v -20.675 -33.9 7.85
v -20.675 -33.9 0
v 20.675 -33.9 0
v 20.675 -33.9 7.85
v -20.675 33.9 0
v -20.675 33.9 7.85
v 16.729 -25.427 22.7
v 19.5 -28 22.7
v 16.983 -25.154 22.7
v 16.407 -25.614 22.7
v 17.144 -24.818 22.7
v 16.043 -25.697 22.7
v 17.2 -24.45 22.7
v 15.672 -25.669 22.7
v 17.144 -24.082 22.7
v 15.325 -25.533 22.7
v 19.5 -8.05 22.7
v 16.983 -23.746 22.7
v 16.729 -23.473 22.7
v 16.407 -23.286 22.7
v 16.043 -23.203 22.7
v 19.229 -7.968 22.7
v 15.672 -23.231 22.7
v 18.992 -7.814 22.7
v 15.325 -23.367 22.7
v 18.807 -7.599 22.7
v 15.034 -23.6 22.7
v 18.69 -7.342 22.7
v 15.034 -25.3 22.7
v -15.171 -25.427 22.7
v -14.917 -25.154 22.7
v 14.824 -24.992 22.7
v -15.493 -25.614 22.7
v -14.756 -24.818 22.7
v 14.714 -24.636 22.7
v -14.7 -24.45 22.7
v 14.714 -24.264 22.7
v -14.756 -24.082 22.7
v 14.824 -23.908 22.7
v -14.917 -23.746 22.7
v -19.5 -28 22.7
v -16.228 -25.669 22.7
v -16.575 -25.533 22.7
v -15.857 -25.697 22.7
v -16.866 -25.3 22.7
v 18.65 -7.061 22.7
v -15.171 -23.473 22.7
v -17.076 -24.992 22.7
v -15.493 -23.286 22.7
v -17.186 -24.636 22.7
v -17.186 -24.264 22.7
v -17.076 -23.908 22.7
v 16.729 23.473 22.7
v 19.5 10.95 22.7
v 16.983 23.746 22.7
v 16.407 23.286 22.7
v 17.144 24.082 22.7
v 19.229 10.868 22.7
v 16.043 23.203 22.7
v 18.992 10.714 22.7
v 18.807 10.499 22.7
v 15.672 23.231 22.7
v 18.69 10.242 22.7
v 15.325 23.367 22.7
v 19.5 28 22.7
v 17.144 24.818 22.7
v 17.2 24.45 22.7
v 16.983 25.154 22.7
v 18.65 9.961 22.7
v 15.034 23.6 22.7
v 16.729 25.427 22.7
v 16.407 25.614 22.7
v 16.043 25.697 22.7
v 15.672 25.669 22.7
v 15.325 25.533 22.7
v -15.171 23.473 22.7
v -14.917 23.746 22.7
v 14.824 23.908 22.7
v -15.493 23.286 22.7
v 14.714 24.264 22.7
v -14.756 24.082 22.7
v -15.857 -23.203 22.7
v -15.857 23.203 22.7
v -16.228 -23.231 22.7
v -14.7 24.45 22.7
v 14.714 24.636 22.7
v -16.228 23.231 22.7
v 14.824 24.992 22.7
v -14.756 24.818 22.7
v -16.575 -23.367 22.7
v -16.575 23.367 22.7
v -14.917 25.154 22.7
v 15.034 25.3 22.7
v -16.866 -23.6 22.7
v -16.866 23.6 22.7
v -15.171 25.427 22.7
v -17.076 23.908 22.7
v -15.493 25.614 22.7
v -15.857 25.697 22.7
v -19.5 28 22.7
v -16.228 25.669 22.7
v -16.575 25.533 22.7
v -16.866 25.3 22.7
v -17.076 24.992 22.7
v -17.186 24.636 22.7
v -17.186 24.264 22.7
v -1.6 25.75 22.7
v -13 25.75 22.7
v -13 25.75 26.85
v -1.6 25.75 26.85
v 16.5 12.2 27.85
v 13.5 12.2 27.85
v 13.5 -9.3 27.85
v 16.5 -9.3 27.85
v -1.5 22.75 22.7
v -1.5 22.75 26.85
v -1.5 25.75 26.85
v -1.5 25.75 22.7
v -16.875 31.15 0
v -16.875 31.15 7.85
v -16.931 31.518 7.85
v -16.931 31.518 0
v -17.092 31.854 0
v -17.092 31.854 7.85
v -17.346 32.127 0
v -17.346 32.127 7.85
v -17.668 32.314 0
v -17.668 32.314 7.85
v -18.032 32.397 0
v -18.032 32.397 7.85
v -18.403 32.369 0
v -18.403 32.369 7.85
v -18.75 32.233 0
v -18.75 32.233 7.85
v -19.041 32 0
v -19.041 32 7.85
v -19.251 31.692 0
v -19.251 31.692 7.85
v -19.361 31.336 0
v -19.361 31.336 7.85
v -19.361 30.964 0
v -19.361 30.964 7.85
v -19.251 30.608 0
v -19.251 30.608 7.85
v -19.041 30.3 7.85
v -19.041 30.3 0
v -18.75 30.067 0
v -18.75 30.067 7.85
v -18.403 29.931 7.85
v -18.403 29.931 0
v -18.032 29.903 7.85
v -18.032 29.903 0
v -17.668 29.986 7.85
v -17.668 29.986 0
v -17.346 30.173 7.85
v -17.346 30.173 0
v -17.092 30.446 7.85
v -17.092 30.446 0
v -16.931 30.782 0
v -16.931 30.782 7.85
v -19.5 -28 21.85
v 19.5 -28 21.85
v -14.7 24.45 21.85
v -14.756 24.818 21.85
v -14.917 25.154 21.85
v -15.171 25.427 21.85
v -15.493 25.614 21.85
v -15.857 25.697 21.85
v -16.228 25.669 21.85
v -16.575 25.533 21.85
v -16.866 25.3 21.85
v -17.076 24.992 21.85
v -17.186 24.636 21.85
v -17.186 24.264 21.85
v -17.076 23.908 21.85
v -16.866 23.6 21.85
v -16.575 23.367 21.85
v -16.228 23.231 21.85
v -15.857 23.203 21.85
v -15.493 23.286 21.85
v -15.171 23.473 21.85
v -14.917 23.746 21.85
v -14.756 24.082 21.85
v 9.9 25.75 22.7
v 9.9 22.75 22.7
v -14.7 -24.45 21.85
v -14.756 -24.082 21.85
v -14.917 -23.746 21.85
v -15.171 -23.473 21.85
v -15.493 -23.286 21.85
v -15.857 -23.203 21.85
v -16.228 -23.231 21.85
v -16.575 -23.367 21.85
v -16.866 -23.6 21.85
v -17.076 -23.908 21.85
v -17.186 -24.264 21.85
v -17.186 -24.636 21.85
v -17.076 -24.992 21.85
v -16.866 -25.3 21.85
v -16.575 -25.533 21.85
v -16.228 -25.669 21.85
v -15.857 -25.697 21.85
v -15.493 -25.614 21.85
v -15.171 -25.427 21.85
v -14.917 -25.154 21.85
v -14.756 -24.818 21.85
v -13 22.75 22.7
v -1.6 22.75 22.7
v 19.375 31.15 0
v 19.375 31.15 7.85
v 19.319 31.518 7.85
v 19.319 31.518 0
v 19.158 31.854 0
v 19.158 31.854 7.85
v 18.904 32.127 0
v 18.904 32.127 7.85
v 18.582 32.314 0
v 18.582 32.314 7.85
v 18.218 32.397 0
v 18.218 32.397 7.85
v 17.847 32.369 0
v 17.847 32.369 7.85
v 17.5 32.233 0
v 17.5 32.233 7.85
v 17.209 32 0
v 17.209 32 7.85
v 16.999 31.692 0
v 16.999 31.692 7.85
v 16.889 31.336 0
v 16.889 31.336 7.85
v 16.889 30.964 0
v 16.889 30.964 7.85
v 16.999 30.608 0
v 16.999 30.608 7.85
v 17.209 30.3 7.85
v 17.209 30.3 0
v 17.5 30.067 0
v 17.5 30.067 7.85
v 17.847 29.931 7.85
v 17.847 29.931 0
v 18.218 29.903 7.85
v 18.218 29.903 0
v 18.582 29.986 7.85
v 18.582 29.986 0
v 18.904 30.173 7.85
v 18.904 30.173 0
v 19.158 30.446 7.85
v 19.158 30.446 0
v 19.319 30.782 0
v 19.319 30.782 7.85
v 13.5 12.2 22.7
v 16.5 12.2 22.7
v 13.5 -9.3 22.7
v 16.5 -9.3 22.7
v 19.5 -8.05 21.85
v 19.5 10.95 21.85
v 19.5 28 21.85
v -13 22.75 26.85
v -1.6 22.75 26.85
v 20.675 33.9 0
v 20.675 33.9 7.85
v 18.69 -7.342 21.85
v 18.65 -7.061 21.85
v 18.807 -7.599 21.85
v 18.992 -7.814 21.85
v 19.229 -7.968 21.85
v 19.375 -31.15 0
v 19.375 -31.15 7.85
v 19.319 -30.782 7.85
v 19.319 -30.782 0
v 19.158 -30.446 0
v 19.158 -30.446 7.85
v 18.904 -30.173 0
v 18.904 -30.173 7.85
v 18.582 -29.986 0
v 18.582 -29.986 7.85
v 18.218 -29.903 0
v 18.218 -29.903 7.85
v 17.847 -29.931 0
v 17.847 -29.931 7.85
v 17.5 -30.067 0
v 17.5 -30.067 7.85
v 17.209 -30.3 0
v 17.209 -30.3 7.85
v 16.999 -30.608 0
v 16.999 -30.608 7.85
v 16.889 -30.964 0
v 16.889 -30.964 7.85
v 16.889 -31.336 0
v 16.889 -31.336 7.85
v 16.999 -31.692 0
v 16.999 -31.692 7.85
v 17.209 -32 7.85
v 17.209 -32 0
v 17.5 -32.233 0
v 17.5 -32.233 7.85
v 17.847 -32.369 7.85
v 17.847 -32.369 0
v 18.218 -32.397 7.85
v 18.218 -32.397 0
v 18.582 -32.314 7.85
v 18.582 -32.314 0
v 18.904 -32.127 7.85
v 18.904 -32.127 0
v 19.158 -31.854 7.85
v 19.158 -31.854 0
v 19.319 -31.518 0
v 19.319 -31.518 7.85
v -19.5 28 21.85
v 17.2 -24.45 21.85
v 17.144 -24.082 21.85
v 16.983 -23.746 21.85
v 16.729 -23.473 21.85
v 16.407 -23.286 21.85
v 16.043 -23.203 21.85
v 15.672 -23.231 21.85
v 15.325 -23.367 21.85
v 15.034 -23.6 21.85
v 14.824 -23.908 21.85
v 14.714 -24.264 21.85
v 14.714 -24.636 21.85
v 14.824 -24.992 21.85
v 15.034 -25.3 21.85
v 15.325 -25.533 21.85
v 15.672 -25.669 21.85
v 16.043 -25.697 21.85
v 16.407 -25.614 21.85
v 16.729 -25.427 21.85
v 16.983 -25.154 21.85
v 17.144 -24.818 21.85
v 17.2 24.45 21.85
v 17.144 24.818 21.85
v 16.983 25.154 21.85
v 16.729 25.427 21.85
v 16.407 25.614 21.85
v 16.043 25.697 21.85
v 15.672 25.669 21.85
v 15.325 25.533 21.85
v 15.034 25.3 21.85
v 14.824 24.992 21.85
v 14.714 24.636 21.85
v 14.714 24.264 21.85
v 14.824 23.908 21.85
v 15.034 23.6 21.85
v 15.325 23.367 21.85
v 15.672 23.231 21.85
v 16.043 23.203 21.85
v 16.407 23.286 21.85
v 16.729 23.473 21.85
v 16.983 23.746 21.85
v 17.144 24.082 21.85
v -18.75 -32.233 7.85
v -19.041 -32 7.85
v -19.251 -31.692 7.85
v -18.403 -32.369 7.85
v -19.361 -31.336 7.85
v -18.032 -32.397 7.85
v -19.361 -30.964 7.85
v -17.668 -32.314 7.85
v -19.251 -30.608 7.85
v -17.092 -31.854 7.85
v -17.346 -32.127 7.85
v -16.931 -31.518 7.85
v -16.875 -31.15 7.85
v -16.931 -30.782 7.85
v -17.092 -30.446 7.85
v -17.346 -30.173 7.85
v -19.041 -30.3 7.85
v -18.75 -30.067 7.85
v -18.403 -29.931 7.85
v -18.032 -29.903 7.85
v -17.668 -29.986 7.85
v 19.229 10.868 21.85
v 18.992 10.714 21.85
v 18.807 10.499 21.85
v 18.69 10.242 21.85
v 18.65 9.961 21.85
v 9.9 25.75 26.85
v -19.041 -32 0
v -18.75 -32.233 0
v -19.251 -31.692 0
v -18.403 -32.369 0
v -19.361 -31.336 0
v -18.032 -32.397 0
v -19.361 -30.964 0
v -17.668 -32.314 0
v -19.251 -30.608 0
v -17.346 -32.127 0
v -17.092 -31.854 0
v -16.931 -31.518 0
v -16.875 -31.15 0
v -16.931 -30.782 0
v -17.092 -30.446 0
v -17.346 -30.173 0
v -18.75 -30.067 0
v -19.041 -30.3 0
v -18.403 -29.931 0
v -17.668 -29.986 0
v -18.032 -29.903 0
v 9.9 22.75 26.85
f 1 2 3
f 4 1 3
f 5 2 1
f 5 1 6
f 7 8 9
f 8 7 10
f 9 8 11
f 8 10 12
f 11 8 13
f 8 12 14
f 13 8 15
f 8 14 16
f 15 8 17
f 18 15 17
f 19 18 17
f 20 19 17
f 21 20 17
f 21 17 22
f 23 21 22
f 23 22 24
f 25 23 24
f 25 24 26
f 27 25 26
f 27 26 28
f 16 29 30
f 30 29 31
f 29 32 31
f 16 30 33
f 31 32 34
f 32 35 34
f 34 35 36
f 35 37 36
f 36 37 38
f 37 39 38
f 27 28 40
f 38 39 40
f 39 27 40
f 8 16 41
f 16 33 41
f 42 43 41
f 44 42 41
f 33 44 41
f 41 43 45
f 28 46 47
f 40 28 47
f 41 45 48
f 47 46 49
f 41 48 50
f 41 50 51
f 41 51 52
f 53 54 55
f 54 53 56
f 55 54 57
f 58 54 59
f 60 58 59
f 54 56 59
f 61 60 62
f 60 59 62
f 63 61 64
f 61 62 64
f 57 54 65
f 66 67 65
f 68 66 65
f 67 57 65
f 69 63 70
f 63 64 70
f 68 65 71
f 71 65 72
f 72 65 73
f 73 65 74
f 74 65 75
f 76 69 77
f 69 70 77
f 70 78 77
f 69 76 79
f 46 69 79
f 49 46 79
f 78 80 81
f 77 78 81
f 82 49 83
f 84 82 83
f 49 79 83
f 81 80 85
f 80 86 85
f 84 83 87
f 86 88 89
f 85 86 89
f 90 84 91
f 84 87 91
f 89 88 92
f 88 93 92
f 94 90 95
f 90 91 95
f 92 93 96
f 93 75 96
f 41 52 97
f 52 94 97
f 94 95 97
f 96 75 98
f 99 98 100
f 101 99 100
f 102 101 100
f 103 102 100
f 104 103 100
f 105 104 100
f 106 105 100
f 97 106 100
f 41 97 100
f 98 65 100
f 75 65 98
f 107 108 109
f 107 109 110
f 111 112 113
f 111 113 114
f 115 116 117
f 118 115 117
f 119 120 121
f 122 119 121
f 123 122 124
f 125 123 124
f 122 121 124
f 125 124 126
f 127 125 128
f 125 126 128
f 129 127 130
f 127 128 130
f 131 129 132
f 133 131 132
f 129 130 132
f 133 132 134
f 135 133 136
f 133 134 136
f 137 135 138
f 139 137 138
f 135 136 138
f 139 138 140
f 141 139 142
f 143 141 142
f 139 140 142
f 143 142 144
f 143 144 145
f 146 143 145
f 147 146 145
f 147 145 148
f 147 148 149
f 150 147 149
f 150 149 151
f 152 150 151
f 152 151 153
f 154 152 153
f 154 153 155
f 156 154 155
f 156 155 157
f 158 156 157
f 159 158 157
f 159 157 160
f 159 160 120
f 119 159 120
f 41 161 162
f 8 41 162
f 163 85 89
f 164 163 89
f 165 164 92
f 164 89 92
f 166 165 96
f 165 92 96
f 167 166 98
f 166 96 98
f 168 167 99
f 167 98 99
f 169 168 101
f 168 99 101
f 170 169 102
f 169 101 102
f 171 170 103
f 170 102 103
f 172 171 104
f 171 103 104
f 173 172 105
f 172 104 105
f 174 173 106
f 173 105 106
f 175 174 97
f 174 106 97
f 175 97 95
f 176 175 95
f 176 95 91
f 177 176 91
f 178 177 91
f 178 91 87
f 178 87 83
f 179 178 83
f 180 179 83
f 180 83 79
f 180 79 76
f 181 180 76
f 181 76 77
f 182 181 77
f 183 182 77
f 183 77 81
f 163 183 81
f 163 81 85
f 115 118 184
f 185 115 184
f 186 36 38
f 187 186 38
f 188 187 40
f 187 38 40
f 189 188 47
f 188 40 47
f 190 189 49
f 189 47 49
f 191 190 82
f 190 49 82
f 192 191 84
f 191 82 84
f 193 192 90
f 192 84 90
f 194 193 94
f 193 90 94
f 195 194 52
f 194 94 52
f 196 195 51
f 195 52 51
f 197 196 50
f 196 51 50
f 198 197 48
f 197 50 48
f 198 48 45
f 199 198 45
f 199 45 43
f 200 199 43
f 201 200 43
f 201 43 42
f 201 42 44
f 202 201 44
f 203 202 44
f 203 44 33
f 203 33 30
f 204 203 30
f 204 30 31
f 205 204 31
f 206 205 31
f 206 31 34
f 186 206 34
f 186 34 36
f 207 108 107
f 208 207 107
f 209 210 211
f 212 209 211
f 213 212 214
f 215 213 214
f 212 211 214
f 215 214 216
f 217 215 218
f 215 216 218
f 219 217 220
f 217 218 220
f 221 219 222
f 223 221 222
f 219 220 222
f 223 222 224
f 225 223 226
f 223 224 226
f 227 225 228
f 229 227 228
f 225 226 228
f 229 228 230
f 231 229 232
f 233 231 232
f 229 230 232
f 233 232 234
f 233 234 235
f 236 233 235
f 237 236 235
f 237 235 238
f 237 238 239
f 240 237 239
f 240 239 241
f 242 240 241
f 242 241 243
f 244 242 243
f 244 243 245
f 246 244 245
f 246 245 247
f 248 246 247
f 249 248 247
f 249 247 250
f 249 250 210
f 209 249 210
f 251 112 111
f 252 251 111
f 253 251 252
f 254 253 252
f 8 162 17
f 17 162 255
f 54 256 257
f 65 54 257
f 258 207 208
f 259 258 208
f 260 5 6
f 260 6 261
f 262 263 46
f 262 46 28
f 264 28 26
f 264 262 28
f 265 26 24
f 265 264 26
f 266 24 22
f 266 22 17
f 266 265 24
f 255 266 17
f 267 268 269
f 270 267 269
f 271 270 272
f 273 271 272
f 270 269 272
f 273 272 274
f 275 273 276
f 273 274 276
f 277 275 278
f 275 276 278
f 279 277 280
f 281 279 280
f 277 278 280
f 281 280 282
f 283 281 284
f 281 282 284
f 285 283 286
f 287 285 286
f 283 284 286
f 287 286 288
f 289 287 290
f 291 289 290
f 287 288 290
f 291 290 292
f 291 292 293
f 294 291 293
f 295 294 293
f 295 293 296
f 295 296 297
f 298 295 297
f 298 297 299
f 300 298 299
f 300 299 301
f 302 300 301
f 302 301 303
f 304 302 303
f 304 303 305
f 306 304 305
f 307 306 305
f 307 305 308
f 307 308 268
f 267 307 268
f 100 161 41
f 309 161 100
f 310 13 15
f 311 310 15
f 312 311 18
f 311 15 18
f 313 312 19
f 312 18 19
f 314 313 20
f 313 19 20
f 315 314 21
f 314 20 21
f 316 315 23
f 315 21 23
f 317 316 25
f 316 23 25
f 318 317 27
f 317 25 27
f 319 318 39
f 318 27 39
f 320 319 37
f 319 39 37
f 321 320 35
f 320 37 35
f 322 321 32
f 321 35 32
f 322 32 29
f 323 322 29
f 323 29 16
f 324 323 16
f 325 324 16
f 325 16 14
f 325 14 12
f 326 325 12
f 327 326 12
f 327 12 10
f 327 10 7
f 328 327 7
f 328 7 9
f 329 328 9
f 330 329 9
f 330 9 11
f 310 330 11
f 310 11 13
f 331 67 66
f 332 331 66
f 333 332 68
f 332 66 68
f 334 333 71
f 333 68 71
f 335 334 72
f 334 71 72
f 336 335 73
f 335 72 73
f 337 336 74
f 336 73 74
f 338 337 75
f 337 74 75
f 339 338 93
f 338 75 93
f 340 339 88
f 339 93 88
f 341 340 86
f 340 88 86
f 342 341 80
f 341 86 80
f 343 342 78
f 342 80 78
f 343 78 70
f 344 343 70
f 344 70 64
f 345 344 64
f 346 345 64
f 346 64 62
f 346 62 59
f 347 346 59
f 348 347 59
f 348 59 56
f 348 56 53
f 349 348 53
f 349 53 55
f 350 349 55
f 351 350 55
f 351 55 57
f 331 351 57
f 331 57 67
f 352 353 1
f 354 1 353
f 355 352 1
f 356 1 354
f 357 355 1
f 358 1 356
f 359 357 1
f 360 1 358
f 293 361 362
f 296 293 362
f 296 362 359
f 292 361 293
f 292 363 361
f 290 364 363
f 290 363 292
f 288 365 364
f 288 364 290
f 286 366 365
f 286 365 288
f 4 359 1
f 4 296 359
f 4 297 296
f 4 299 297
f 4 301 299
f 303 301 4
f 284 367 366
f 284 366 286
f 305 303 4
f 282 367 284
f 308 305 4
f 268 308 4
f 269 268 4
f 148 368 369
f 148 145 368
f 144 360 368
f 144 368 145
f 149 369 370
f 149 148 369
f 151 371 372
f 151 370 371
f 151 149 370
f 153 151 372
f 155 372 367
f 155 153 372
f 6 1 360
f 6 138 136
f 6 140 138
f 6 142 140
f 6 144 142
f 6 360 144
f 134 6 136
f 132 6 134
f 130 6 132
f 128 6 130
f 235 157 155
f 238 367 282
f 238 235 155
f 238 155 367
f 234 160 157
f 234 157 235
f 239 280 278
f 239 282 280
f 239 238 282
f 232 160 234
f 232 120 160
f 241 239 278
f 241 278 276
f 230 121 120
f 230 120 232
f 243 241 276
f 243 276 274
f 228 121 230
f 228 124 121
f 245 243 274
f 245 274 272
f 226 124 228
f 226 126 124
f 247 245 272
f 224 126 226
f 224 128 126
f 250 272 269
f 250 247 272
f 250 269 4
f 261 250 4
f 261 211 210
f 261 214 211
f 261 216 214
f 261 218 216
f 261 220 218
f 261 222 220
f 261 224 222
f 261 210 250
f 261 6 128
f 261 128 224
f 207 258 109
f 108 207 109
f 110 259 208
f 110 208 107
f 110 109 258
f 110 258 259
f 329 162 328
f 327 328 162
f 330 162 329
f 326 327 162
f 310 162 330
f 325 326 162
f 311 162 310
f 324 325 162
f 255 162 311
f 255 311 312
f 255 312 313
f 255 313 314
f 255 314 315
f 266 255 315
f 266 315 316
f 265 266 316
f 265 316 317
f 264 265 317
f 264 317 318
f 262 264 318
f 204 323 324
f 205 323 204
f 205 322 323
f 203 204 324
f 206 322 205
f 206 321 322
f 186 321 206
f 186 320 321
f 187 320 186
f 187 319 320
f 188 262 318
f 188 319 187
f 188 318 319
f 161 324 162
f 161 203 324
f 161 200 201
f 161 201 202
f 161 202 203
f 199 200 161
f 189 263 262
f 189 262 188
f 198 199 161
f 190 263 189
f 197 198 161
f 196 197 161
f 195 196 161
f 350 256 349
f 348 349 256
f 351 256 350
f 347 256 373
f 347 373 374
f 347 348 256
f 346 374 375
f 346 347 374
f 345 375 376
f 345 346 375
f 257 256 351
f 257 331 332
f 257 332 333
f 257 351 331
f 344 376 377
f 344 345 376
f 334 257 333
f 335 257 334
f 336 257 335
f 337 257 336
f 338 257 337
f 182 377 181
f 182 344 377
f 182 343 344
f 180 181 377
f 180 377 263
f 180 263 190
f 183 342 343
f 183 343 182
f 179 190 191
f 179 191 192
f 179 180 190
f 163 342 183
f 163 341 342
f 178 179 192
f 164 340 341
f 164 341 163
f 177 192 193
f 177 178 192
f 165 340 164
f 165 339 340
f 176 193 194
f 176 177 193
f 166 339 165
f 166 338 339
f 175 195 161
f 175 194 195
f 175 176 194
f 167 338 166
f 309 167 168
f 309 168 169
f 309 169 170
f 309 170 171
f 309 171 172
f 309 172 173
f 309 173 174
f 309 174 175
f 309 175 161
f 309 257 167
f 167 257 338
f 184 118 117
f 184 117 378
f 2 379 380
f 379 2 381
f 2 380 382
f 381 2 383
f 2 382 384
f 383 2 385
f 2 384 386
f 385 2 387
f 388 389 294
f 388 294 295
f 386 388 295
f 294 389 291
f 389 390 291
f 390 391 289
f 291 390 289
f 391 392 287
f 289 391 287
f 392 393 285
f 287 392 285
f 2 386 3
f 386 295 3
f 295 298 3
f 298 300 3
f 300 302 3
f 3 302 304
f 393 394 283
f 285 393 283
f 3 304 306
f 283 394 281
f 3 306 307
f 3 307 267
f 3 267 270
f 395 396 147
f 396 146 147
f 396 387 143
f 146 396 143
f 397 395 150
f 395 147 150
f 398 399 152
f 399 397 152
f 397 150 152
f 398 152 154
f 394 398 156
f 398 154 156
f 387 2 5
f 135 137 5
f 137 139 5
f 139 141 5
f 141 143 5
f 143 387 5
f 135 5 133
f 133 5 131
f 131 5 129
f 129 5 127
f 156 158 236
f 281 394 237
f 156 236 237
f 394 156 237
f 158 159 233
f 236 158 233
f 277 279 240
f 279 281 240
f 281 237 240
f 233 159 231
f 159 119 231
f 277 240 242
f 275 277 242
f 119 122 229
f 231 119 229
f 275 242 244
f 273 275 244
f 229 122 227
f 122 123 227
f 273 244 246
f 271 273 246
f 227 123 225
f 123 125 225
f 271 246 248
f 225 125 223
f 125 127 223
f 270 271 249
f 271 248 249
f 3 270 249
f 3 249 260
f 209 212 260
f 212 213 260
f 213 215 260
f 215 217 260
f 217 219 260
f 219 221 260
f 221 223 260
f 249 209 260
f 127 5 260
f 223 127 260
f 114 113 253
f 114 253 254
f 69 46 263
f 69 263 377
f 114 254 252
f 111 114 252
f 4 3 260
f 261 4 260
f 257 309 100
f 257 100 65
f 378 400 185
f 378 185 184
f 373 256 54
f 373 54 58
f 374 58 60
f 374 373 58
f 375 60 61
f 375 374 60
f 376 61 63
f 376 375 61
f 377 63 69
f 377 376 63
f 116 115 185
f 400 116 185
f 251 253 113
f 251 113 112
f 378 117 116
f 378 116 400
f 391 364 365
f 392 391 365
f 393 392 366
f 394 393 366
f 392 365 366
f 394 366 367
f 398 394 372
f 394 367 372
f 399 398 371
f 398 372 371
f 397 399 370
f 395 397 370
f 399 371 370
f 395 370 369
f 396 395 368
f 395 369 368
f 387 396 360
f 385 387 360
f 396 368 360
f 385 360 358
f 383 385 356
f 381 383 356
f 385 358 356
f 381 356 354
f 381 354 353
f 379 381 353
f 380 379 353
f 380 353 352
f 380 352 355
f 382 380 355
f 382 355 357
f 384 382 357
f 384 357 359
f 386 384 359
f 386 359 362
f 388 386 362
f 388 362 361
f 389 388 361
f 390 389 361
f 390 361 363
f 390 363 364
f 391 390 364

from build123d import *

# Parameters (mm, degrees)
F0_W         = 41.35
F0_H         = 67.8
F1_DEPTH     = 7.85
F2_R         = 1.25
F3_DEPTH     = 7.851
F5_W         = 39
F5_H         = 56
F6_DEPTH     = 0.85
F7_R         = 1.25
F8_DEPTH     = 22.701
F9_W         = 3
F9_H         = 21.5
F10_DEPTH    = 5.15
F9_W_2       = 11.4
F9_H_2       = 3
F11_DEPTH    = 4.15
F12_W        = 0.85
F12_H        = 19
F13_DEPTH    = 22.701
F14_T1_DEPTH = 0.85


# Not quite as in the source:
# - a fillet or chamfer that OpenCascade refuses, or shapes differently, is made with other operations: its cross-section is extruded or revolved along the edge and cut away or added


with BuildPart() as f1:
    # F0 (on Top) → F1 (new body)
    with BuildSketch(Plane.XY):
        Rectangle(F0_W, F0_H)
    extrude(amount=F1_DEPTH)

    # F2 (on face) → F3 (cut, through all)
    with BuildSketch(Plane.XY.offset(7.85)):
        with Locations((-18.125, -31.15)):
            Circle(F2_R)
        with Locations((-18.125, 31.15)):
            Circle(F2_R)
        with Locations((18.125, 31.15)):
            Circle(F2_R)
        with Locations((18.125, -31.15)):
            Circle(F2_R)
    extrude(amount=-F3_DEPTH, mode=Mode.SUBTRACT)


with BuildPart() as f6:
    # F5 (on offset) → F6 (new body)
    with BuildSketch(Plane.XY.offset(21.85)):
        Rectangle(F5_W, F5_H)
    extrude(amount=F6_DEPTH)

    # F7 (on face) → F8 (cut, through all)
    with BuildSketch(Plane.XY.offset(22.7)):
        with Locations((-15.95, 24.45)):
            Circle(F7_R)
        with Locations((-15.95, -24.45)):
            Circle(F7_R)
        with Locations((15.95, 24.45)):
            Circle(F7_R)
        with Locations((15.95, -24.45)):
            Circle(F7_R)
    extrude(amount=-F8_DEPTH, mode=Mode.SUBTRACT)

    # F12 (on face) → F13 (cut, through all)
    with BuildSketch(Plane.XY.offset(22.7)):
        with Locations((19.075, 1.45)):
            Rectangle(F12_W, F12_H)
    extrude(amount=-F13_DEPTH, mode=Mode.SUBTRACT)

    # F14: fillet of radius 1 on 2 edges, made by hand

    # F14_s2 → F14_t1 (join)
    with BuildSketch(Plane.XY.offset(21.85)):
        with BuildLine():
            ThreePointArc((19.5, 10.95), (18.8917124556, 10.6132342439), (18.65, 9.9613140033))
            Line((18.65, 9.9613140033), (18.65, 10.95))
            Line((18.65, 10.95), (19.5, 10.95))
        make_face()
        with BuildLine():
            ThreePointArc((18.65, -7.0613140033), (18.8917124556, -7.7132342439), (19.5, -8.05))
            Line((19.5, -8.05), (18.65, -8.05))
            Line((18.65, -8.05), (18.65, -7.0613140033))
        make_face()
    extrude(amount=F14_T1_DEPTH)


with BuildPart() as f10:
    # F9 (on face) → F10 (new body)
    with BuildSketch(Plane.XY.offset(22.7)):
        with Locations((15, 1.45)):
            Rectangle(F9_W, F9_H)
    extrude(amount=F10_DEPTH)


with BuildPart() as f11:
    # F9 (on face) → F11 (new body)
    with BuildSketch(Plane.XY.offset(22.7)):
        with Locations((-7.3, 24.25)):
            Rectangle(F9_W_2, F9_H_2)
    extrude(amount=F11_DEPTH)


with BuildPart() as f11b:
    # F9 (on face) → F11, piece 2 (new body)
    with BuildSketch(Plane.XY.offset(22.7)):
        with Locations((4.2, 24.25)):
            Rectangle(F9_W_2, F9_H_2)
    extrude(amount=F11_DEPTH)


solid = Compound([f1.part, f6.part, f10.part, f11.part, f11b.part])
